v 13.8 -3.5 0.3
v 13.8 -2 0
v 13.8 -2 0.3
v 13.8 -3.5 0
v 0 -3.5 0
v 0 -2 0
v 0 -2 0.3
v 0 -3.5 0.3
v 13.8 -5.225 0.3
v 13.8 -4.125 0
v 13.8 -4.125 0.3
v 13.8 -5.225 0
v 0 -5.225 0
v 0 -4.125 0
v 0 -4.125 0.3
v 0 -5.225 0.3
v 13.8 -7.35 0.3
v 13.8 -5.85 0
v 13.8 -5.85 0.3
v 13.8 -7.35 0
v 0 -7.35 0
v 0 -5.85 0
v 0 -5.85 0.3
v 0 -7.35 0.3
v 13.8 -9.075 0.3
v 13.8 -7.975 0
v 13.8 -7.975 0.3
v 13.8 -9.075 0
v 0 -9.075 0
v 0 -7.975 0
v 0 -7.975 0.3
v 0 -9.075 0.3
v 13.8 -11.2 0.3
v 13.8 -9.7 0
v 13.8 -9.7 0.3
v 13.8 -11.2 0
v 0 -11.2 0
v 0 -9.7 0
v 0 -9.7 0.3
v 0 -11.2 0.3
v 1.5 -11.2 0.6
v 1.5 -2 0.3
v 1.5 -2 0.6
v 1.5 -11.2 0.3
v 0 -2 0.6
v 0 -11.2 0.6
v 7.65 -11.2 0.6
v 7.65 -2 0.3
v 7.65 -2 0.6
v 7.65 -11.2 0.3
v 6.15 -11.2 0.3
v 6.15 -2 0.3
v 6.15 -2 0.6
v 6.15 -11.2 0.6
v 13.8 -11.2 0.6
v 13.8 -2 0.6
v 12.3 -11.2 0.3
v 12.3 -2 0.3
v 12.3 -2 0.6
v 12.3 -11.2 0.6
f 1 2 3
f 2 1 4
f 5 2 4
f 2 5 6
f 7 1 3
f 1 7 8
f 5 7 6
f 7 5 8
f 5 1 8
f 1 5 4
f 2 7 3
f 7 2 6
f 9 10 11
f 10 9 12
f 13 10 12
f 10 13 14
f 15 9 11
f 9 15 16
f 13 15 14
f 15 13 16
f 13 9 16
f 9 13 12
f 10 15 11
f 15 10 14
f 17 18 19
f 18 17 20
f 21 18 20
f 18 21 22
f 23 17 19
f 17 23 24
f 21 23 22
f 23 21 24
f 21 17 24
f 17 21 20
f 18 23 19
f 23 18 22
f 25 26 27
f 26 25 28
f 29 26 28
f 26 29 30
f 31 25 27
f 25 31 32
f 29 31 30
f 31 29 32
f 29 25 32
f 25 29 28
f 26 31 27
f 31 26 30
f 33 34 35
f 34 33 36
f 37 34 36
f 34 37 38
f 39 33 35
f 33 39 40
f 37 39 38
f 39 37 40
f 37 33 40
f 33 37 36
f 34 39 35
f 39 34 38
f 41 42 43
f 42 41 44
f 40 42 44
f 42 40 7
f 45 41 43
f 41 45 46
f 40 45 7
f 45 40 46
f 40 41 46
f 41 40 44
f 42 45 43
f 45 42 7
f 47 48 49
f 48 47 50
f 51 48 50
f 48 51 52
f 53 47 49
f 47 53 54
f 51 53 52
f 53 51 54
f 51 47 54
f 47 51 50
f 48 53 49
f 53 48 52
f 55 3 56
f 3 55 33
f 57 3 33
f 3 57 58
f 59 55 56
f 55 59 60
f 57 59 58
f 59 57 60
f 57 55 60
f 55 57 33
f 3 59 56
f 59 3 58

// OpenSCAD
//Europalette
 

//Customize
scale=1/87;
separate=true;
 

 
//Maße
fac=scale*87;
oMat=0.3;
mat=max(0.25,oMat*fac);
lng=13.8*fac;
wid=9.2*fac;
b1=1.1*fac;
b2=1.5*fac;
kMat=oMat*6*fac-mat*3+0.05;
brim=0.8;
brimh=0.3;
 
//Positionen
px1=(lng-b2)/2;
px2=lng-b2;
py1=(wid-b1)/2;
py2=wid-b1;
qy1=(wid-b2)/2;
qy2=wid-b2;
luecke=((wid-3*b2)/2-b1)/2;
z1=b2+luecke;
z2=qy1+b2+luecke;
 

 

//bottom();
if(separate) at(0,-2,mat*2) rotate([180,0,0]) top();
else at(0,0,mat+kMat) top();
 
 
//brim/Hilfssteg
/*color("red"){
    at(b2-brim,0)box(brim,wid,brimh);
    at((lng-brim)/2,0)box(brim,wid,brimh);
    at(lng-b2,0)box(brim,wid,brimh);
}*/
 
module bottom(){
    //Bodenbretter
    brettLaengs(b1);//Bodenrandbrett
    at(0,qy1) brettLaengs(b2);//Bodenmittelbrett
    at(0,py2) brettLaengs(b1);//Bodenrandbrett
 
    //Klötze
    at(0,0,mat){
        dreiKloetze(b1);
        at(0,qy1) dreiKloetze(b2);
        at(0,py2) dreiKloetze(b1);
    }
}
 
module top(){
    //3x Querbrett
    brettQuer(b2);
    at(px1) brettQuer(b2);
    at(px2) brettQuer(b2);
 
    //Deckbretter
    at(0,0,mat){
        brettLaengs(b2);
        at(0,z1) brettLaengs(b1);
        at(0,qy1) brettLaengs(b2);
        at(0,z2) brettLaengs(b1);
        at(0,qy2) brettLaengs(b2);
    }
    
}
 
module dreiKloetze(b){
     klotz(b);
     at(px1) klotz(b);
     at(px2) klotz(b);
}
 
module klotz(b){
    box(b2,b,kMat);
}
 
module brettLaengs(b){
    box(lng,b,mat);
}
 

module brettQuer(b){
    box(b,wid,mat);
}
 

//Tipparbeit sparen ;)
 
module at(x=0,y=0,z=0){
    translate([x,y,z]) children();
}
 
module box(w,h,d){
    cube([w,h,d]);
}
 
